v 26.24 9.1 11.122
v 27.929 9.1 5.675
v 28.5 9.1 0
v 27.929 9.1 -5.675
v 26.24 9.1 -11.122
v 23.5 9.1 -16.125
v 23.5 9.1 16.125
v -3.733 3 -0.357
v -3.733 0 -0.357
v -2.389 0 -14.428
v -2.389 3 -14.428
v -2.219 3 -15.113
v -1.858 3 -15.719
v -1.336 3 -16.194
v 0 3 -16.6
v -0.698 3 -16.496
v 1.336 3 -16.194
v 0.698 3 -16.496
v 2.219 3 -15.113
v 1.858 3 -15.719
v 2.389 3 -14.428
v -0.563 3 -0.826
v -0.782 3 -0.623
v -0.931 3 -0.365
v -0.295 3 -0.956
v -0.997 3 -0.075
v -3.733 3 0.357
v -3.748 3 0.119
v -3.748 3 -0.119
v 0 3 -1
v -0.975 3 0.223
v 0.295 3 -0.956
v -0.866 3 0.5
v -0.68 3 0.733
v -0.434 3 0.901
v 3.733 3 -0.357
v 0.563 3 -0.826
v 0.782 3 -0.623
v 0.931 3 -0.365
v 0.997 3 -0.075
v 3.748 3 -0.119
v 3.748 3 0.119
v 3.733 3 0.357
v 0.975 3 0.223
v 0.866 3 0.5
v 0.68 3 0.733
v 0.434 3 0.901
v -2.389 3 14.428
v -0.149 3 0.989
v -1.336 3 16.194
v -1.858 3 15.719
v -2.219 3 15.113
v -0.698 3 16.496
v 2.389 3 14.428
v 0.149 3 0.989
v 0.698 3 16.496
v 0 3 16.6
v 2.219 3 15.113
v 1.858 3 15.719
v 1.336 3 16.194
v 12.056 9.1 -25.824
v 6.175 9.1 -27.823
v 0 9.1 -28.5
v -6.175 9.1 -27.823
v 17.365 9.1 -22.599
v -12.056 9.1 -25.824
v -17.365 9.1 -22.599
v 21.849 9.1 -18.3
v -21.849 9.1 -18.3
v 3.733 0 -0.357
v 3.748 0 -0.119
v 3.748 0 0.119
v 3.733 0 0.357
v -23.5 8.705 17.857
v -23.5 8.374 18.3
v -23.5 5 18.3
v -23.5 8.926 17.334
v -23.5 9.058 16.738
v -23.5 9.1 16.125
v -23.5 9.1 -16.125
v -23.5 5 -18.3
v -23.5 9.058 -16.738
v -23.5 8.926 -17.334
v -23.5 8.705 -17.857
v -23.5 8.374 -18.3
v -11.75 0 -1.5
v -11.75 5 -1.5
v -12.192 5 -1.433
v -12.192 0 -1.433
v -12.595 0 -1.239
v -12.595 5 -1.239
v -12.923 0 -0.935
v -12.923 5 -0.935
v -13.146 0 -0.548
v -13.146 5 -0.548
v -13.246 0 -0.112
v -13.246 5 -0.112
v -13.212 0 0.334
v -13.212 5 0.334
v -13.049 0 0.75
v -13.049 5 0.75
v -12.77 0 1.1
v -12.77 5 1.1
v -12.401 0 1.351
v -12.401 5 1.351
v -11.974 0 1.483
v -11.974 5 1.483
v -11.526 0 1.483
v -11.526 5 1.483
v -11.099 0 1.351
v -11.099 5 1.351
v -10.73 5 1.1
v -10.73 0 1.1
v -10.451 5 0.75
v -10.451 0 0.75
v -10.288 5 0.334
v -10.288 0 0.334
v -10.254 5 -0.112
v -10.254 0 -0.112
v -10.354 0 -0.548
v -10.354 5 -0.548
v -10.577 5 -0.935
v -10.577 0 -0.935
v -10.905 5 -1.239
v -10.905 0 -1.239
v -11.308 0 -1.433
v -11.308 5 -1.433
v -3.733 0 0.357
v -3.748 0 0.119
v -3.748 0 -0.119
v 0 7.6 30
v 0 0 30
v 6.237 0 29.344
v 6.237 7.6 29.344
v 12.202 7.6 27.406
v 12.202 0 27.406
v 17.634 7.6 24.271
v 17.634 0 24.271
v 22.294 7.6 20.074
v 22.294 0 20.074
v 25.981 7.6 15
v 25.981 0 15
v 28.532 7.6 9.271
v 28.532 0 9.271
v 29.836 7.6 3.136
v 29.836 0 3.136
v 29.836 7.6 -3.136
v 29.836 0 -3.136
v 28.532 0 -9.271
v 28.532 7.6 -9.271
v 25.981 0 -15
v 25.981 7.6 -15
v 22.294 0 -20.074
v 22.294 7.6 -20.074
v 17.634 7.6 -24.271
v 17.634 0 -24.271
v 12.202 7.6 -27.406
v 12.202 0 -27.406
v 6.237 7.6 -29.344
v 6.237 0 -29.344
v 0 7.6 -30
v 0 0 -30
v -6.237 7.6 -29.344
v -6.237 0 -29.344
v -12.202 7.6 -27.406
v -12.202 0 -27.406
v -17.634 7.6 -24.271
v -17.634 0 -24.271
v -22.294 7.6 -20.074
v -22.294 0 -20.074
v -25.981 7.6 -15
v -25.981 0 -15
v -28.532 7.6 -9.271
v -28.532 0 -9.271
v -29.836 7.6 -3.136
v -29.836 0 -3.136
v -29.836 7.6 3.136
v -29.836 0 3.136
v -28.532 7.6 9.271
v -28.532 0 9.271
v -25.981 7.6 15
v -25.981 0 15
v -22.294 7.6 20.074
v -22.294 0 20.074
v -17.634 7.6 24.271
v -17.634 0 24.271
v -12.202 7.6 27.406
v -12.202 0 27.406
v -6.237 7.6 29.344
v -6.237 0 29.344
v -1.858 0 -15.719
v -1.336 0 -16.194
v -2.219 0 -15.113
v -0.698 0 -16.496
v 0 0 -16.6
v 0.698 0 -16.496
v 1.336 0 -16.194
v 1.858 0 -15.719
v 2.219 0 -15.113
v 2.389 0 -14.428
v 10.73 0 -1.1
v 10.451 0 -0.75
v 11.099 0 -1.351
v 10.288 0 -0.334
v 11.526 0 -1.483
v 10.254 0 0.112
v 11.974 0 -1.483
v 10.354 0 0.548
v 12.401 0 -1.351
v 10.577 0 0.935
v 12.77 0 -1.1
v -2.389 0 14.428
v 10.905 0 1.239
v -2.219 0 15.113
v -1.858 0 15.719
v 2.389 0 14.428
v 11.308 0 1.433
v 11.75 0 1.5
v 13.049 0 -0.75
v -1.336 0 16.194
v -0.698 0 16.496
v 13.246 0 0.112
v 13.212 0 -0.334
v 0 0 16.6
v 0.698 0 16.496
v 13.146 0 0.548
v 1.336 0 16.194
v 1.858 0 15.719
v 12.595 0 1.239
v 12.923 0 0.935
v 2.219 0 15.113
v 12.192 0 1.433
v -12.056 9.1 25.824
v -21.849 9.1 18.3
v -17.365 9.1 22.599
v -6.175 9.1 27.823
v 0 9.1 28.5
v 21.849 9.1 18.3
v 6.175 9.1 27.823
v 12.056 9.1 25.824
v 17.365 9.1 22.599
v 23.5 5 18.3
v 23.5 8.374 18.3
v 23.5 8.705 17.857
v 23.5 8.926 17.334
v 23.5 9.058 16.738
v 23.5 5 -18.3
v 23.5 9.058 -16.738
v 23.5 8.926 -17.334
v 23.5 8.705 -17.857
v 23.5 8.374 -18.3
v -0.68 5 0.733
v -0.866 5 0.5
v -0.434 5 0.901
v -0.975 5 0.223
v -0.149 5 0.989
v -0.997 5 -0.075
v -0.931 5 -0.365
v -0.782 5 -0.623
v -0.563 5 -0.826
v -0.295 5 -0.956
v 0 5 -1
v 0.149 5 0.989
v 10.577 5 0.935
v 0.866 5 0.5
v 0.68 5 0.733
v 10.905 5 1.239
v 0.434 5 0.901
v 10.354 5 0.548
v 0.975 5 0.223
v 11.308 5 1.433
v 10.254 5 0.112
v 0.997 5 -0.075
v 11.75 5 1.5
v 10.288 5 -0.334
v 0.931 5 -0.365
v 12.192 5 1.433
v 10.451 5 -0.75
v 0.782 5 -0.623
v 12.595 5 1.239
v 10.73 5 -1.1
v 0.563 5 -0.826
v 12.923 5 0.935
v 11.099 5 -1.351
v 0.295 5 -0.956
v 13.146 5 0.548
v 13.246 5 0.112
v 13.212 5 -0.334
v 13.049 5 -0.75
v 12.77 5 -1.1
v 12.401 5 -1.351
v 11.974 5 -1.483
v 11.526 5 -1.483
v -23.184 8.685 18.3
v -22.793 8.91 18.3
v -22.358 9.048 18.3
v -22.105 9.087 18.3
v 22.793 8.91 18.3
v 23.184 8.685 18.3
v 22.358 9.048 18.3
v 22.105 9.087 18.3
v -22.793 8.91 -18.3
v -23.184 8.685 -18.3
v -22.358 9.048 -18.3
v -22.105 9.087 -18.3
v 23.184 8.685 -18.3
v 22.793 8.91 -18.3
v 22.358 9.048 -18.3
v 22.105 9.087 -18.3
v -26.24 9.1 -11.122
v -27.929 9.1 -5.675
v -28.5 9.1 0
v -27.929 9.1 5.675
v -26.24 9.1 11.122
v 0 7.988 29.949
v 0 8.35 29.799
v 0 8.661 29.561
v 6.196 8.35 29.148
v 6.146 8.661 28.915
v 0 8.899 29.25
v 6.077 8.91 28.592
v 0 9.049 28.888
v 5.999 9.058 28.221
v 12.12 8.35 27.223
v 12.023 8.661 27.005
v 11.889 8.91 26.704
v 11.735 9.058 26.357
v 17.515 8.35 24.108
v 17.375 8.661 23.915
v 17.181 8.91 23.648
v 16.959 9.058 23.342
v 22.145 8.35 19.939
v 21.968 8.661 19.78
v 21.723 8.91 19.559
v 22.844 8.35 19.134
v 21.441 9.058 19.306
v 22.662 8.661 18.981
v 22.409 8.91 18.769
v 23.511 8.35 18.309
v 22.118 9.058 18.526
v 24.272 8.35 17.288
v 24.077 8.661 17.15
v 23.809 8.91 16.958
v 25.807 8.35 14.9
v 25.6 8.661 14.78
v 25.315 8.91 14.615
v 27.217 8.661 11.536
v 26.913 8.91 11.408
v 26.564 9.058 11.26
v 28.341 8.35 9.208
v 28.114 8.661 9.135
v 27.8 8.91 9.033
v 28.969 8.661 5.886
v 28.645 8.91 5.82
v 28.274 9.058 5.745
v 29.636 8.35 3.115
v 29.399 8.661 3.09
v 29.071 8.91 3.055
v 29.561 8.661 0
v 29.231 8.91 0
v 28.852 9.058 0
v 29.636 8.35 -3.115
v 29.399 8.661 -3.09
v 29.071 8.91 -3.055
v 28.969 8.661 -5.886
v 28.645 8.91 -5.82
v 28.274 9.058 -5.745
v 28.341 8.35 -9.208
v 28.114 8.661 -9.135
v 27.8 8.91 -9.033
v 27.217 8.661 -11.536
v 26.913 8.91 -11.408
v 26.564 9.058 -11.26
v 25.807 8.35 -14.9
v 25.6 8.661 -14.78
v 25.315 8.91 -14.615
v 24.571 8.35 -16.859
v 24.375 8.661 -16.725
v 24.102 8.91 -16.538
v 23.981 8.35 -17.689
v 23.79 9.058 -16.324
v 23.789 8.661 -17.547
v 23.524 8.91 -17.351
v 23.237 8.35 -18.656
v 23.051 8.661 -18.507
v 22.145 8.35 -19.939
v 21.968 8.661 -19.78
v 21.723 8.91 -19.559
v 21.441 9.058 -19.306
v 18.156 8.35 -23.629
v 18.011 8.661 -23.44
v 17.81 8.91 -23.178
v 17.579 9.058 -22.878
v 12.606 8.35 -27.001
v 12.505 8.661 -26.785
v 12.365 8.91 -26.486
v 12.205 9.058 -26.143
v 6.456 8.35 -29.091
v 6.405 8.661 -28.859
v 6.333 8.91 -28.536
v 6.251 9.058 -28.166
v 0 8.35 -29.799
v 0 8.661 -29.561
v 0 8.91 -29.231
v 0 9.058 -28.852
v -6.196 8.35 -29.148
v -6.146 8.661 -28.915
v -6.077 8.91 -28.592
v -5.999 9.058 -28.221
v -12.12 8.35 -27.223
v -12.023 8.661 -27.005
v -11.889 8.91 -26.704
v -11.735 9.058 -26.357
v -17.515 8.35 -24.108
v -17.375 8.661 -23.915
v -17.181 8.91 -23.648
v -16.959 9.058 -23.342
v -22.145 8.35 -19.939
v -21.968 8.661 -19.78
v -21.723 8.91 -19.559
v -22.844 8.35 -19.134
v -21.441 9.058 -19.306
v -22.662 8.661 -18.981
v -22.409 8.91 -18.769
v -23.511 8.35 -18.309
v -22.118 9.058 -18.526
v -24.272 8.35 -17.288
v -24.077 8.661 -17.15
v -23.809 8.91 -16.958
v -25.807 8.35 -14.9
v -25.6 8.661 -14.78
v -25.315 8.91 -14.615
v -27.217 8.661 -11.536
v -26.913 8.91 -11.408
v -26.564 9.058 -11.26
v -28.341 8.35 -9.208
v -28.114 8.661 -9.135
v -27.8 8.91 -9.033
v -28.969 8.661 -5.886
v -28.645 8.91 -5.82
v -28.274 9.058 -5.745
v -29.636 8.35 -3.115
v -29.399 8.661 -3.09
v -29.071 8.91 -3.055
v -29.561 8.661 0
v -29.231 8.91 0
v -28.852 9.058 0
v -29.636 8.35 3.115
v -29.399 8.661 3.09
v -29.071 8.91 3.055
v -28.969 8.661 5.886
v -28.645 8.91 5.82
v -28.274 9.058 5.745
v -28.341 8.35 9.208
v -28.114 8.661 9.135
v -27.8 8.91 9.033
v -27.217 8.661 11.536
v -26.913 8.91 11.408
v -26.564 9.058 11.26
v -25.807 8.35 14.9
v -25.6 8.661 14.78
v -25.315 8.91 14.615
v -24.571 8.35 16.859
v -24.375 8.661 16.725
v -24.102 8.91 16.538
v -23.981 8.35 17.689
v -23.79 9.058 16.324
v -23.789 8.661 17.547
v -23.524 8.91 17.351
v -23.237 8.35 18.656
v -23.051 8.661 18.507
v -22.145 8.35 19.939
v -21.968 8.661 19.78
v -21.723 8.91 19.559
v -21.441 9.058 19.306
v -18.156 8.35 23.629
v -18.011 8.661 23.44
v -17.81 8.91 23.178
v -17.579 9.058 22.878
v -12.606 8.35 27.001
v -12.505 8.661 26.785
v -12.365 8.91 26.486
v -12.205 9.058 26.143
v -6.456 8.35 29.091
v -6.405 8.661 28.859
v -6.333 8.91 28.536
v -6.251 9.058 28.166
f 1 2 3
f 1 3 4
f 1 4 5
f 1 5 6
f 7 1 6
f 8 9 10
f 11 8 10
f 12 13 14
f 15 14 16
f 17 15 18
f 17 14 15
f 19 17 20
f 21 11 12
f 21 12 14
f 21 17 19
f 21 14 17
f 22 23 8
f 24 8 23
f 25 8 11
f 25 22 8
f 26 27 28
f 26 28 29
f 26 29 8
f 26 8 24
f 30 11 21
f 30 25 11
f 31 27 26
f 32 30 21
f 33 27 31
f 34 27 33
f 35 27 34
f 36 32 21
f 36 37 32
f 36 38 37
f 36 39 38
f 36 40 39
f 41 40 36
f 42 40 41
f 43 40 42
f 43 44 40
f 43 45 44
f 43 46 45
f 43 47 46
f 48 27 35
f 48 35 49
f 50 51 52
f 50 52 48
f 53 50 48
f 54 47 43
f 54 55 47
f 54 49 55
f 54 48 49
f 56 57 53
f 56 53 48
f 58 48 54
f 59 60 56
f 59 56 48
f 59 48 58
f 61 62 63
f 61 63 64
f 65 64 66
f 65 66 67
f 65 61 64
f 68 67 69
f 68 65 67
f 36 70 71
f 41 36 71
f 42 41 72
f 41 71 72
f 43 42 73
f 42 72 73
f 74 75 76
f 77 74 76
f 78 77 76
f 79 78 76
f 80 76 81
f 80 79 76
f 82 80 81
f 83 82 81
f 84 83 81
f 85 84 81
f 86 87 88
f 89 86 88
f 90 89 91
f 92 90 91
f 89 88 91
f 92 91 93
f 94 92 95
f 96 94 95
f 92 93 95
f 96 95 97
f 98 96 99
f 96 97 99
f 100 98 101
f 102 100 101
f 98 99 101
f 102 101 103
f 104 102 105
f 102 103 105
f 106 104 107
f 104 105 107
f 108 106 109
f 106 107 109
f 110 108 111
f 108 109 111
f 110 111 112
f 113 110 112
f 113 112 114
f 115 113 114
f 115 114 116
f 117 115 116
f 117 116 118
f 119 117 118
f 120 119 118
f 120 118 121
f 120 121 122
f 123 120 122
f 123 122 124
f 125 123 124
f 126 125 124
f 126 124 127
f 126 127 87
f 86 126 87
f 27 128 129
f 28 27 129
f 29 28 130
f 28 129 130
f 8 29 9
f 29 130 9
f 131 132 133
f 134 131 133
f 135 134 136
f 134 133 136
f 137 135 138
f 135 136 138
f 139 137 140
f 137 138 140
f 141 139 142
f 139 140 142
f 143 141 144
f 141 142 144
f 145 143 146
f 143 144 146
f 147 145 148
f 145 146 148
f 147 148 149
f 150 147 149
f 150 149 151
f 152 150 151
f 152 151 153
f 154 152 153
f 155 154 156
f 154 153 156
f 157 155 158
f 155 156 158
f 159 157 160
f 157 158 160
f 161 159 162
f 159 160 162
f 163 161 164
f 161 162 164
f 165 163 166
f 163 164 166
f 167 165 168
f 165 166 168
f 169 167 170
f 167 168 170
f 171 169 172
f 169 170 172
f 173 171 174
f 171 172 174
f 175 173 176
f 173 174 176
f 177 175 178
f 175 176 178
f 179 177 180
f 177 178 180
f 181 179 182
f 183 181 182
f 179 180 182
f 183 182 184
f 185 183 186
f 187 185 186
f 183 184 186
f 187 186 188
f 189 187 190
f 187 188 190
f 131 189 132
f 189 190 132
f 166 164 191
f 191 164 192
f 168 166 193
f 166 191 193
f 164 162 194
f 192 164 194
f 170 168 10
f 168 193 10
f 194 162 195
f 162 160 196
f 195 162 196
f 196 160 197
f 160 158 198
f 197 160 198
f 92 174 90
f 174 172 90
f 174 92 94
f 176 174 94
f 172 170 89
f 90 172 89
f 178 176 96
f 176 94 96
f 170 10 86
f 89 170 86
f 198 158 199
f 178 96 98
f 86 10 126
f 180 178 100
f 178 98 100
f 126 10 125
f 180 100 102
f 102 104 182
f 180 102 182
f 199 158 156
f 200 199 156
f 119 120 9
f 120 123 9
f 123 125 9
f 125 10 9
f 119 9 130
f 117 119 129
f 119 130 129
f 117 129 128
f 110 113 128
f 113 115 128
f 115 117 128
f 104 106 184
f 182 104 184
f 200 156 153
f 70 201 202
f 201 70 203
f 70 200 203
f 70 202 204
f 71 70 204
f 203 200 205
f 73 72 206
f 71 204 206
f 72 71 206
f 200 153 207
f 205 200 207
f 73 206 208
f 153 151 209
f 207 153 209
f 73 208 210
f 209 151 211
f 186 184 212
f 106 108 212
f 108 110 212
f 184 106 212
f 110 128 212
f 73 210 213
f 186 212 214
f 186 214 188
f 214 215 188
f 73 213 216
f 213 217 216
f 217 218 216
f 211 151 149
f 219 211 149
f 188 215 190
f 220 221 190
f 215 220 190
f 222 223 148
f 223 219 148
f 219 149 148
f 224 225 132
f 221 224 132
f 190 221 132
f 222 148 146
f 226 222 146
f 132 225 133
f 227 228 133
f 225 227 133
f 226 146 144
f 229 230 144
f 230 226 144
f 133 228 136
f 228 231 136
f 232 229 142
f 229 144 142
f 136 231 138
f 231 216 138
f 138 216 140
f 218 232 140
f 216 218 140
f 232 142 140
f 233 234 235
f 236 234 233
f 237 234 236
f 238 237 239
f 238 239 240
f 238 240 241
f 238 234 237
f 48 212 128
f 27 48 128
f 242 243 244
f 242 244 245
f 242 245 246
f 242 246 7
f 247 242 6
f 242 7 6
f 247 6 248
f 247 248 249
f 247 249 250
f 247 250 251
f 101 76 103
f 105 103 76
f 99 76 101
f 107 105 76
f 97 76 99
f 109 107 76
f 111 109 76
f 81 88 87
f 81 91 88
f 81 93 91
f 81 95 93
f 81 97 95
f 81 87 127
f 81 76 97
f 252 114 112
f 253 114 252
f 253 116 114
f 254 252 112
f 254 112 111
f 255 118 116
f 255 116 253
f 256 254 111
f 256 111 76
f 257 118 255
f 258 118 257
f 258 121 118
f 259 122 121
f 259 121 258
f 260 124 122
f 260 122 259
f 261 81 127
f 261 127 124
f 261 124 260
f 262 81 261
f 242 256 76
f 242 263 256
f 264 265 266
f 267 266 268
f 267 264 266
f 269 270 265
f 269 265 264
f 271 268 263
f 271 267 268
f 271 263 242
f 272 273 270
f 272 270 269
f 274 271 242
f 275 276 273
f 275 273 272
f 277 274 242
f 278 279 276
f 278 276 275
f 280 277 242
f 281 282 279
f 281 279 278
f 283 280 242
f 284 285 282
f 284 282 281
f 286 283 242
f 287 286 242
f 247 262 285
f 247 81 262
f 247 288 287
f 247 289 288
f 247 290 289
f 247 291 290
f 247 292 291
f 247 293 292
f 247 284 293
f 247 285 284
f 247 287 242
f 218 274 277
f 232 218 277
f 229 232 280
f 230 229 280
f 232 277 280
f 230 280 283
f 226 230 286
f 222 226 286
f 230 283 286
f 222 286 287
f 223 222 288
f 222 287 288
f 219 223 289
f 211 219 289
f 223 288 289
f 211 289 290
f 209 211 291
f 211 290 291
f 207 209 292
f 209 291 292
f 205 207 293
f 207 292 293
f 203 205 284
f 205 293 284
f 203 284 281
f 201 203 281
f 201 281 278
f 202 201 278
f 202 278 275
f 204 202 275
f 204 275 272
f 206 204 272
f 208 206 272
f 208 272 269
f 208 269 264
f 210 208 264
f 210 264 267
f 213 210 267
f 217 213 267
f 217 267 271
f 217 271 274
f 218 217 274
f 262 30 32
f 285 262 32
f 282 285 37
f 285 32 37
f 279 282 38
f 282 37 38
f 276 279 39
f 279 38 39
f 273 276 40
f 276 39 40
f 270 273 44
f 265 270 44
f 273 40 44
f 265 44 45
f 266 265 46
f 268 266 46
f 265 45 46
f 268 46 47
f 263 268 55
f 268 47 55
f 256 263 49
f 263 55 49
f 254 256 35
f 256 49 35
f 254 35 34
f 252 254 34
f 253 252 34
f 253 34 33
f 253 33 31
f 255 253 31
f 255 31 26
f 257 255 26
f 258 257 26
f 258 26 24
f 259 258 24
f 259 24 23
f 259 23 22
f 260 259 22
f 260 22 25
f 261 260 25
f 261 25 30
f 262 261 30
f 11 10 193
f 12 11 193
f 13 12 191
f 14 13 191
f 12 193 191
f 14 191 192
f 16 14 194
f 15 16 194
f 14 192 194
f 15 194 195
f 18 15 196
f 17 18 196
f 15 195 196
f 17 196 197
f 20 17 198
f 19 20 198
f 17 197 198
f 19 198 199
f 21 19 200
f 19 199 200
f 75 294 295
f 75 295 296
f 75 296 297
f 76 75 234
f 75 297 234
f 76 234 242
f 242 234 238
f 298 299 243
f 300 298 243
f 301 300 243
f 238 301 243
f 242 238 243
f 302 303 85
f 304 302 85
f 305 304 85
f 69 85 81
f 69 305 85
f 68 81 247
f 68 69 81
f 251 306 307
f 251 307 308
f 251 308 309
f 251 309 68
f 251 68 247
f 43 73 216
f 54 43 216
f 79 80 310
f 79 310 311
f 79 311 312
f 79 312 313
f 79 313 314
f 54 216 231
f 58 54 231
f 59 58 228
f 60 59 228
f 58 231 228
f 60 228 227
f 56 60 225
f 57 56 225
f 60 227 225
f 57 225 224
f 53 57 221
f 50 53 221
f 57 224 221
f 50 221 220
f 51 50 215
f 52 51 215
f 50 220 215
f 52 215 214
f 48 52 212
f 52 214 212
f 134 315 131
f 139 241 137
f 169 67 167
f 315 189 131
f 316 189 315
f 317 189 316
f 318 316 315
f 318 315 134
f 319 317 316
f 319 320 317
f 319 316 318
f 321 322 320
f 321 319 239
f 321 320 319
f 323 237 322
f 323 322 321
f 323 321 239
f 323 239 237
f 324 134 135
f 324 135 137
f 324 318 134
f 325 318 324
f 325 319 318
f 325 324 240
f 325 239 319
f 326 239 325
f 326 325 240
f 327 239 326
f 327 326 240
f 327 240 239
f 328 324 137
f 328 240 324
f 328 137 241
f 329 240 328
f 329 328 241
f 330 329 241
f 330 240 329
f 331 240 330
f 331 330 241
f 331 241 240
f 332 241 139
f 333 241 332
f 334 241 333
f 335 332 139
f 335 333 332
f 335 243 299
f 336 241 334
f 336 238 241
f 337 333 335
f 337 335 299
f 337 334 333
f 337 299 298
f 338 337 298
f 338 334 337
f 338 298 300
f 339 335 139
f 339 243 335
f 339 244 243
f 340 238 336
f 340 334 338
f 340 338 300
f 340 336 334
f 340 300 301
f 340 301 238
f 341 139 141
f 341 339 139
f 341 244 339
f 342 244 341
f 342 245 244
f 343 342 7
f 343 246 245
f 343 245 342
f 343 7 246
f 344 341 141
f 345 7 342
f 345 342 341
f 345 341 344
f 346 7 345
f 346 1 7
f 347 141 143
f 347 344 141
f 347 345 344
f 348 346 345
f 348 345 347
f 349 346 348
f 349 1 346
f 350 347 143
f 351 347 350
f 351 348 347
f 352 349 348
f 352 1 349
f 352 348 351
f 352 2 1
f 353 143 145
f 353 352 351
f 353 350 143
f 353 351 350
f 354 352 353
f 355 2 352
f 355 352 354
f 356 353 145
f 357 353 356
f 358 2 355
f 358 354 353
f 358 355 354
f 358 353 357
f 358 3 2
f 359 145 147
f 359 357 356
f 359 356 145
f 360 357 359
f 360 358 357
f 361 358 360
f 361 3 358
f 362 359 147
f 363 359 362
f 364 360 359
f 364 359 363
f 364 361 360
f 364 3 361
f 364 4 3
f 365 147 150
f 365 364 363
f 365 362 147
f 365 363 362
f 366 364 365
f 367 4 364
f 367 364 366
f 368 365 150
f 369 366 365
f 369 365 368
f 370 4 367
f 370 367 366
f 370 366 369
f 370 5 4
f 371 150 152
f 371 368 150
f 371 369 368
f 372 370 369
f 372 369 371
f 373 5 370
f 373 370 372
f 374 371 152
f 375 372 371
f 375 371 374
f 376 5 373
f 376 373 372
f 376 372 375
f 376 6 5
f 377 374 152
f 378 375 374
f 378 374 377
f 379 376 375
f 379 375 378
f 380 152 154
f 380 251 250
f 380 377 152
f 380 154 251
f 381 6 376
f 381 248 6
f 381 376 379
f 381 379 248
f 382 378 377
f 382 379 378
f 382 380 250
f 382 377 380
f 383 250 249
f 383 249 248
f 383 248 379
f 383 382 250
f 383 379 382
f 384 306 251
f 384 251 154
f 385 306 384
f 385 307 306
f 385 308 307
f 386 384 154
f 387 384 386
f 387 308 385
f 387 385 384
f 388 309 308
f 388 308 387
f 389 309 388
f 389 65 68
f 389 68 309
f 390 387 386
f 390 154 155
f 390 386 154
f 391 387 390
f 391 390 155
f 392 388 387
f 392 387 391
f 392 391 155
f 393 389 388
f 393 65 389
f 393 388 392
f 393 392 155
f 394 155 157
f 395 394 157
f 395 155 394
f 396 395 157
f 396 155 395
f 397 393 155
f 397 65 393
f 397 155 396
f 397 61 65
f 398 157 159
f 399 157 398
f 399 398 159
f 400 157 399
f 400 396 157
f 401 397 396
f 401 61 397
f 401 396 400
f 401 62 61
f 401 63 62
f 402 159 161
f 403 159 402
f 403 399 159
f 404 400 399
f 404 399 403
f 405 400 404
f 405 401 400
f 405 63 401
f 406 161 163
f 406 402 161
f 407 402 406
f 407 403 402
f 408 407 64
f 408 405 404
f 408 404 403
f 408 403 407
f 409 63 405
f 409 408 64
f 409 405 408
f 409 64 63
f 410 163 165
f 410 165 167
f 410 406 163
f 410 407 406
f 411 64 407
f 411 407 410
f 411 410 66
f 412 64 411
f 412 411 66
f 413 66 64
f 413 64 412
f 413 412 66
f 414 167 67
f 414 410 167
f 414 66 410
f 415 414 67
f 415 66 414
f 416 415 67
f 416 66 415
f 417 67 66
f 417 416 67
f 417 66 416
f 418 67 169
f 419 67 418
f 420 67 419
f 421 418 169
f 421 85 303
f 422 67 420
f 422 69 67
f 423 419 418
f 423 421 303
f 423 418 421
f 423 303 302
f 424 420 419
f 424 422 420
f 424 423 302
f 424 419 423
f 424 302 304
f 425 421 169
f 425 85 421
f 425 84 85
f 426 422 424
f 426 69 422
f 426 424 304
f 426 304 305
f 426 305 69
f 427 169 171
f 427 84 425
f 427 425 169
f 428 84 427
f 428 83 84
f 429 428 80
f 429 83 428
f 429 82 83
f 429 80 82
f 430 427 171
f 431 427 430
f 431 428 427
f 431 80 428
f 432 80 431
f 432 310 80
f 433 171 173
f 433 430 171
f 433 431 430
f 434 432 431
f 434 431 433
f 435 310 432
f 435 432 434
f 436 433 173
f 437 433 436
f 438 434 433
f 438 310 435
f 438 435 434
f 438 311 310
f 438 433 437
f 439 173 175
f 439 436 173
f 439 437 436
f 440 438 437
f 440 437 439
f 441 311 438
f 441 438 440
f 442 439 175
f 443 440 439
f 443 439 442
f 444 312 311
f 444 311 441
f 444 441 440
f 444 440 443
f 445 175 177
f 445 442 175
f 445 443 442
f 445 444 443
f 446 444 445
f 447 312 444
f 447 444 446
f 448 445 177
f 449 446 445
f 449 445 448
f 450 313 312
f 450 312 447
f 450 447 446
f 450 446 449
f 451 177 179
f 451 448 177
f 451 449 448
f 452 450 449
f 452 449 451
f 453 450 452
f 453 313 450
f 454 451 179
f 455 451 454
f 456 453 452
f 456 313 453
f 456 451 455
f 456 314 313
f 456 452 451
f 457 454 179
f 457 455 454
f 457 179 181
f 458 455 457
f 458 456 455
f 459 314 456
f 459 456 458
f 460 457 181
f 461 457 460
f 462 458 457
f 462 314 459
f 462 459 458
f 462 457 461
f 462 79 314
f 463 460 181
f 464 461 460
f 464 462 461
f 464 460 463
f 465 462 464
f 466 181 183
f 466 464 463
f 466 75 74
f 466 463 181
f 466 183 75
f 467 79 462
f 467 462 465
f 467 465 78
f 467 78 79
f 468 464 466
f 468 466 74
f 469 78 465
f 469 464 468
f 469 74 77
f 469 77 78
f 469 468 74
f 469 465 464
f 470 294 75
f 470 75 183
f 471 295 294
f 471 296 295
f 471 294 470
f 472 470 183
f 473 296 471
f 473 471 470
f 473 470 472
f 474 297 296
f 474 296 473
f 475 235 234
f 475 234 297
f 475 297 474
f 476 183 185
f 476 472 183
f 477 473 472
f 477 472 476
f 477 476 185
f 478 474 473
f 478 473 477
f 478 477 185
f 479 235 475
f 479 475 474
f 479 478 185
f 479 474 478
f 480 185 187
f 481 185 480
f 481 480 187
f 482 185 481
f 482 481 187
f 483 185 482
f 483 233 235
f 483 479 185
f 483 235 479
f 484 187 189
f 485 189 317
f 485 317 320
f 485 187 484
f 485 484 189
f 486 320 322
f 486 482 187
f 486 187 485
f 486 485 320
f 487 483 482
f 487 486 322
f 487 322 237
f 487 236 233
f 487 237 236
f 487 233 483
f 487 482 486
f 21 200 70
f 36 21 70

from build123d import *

# Parameters (mm, degrees)
SKETCH1_R           = 30
BOSS_EXTRUDE1_DEPTH = 9.1
FILLET1_R           = 1.5
SKETCH2_W           = 47
SKETCH2_H           = 36.6
CUT_EXTRUDE1_DEPTH  = 4.1
SKETCH3_R           = 1.5
CUT_EXTRUDE2_DEPTH  = 43.720018867
CUT_EXTRUDE3_DEPTH  = 3
SKETCH5_R           = 1
CUT_EXTRUDE4_DEPTH  = 43.862687891


with BuildPart() as part:
    # Sketch1 → Boss-Extrude1 (new body)
    with BuildSketch(Plane(origin=(0, 0, 0), x_dir=(1, 0, 0), z_dir=(0, 1, 0))):
        with Locations(Location((0, 0, 0), (0, 0, 270))):
            Circle(SKETCH1_R)
    extrude(amount=BOSS_EXTRUDE1_DEPTH)

    # Fillet1
    fillet1_edges = [part.edges().sort_by_distance(p)[0] for p in [
        (0, 9.1, -30),
    ]]
    fillet(fillet1_edges, radius=FILLET1_R)

    # Sketch2 → Cut-Extrude1 (cut)
    with BuildSketch(Plane(origin=(0, 9.1, 0), x_dir=(1, 0, 0), z_dir=(0, 1, 0))):
        Rectangle(SKETCH2_W, SKETCH2_H)
    extrude(amount=-CUT_EXTRUDE1_DEPTH, mode=Mode.SUBTRACT)

    # Sketch3 → Cut-Extrude2 (cut, through all)
    with BuildSketch(Plane(origin=(0, 5, 0), x_dir=(1, 0, 0), z_dir=(0, 1, 0))):
        with Locations(Location((11.75, 0, 0), (0, 0, 270))):
            Circle(SKETCH3_R)
        with Locations(Location((-11.75, 0, 0), (0, 0, 90))):
            Circle(SKETCH3_R)
    extrude(amount=-CUT_EXTRUDE2_DEPTH, mode=Mode.SUBTRACT)

    # Sketch4 → Cut-Extrude3 (cut)
    with BuildSketch(Plane.XZ):
        with BuildLine():
            Line((-2.389129319, 14.428169014), (-3.73301456, 0.356514085))
            ThreePointArc((-3.73301456, 0.356514085), (-3.75, 0), (-3.73301456, -0.356514085))
            Line((-3.73301456, -0.356514085), (-2.389129319, -14.428169014))
            ThreePointArc((-2.389129319, -14.428169014), (0, -16.6), (2.389129319, -14.428169014))
            Line((2.389129319, -14.428169014), (3.73301456, -0.356514085))
            ThreePointArc((3.73301456, -0.356514085), (3.75, 0), (3.73301456, 0.356514085))
            Line((3.73301456, 0.356514085), (2.389129319, 14.428169014))
            ThreePointArc((2.389129319, 14.428169014), (0, 16.6), (-2.389129319, 14.428169014))
        make_face()
    extrude(amount=-CUT_EXTRUDE3_DEPTH, mode=Mode.SUBTRACT)

    # Sketch5 → Cut-Extrude4 (cut, through all)
    with BuildSketch(Plane.XZ.offset(-3)):
        with Locations(Location((0, 0, 0), (0, 0, 270))):
            Circle(SKETCH5_R)
    extrude(amount=-CUT_EXTRUDE4_DEPTH, mode=Mode.SUBTRACT)


solid = part.part
